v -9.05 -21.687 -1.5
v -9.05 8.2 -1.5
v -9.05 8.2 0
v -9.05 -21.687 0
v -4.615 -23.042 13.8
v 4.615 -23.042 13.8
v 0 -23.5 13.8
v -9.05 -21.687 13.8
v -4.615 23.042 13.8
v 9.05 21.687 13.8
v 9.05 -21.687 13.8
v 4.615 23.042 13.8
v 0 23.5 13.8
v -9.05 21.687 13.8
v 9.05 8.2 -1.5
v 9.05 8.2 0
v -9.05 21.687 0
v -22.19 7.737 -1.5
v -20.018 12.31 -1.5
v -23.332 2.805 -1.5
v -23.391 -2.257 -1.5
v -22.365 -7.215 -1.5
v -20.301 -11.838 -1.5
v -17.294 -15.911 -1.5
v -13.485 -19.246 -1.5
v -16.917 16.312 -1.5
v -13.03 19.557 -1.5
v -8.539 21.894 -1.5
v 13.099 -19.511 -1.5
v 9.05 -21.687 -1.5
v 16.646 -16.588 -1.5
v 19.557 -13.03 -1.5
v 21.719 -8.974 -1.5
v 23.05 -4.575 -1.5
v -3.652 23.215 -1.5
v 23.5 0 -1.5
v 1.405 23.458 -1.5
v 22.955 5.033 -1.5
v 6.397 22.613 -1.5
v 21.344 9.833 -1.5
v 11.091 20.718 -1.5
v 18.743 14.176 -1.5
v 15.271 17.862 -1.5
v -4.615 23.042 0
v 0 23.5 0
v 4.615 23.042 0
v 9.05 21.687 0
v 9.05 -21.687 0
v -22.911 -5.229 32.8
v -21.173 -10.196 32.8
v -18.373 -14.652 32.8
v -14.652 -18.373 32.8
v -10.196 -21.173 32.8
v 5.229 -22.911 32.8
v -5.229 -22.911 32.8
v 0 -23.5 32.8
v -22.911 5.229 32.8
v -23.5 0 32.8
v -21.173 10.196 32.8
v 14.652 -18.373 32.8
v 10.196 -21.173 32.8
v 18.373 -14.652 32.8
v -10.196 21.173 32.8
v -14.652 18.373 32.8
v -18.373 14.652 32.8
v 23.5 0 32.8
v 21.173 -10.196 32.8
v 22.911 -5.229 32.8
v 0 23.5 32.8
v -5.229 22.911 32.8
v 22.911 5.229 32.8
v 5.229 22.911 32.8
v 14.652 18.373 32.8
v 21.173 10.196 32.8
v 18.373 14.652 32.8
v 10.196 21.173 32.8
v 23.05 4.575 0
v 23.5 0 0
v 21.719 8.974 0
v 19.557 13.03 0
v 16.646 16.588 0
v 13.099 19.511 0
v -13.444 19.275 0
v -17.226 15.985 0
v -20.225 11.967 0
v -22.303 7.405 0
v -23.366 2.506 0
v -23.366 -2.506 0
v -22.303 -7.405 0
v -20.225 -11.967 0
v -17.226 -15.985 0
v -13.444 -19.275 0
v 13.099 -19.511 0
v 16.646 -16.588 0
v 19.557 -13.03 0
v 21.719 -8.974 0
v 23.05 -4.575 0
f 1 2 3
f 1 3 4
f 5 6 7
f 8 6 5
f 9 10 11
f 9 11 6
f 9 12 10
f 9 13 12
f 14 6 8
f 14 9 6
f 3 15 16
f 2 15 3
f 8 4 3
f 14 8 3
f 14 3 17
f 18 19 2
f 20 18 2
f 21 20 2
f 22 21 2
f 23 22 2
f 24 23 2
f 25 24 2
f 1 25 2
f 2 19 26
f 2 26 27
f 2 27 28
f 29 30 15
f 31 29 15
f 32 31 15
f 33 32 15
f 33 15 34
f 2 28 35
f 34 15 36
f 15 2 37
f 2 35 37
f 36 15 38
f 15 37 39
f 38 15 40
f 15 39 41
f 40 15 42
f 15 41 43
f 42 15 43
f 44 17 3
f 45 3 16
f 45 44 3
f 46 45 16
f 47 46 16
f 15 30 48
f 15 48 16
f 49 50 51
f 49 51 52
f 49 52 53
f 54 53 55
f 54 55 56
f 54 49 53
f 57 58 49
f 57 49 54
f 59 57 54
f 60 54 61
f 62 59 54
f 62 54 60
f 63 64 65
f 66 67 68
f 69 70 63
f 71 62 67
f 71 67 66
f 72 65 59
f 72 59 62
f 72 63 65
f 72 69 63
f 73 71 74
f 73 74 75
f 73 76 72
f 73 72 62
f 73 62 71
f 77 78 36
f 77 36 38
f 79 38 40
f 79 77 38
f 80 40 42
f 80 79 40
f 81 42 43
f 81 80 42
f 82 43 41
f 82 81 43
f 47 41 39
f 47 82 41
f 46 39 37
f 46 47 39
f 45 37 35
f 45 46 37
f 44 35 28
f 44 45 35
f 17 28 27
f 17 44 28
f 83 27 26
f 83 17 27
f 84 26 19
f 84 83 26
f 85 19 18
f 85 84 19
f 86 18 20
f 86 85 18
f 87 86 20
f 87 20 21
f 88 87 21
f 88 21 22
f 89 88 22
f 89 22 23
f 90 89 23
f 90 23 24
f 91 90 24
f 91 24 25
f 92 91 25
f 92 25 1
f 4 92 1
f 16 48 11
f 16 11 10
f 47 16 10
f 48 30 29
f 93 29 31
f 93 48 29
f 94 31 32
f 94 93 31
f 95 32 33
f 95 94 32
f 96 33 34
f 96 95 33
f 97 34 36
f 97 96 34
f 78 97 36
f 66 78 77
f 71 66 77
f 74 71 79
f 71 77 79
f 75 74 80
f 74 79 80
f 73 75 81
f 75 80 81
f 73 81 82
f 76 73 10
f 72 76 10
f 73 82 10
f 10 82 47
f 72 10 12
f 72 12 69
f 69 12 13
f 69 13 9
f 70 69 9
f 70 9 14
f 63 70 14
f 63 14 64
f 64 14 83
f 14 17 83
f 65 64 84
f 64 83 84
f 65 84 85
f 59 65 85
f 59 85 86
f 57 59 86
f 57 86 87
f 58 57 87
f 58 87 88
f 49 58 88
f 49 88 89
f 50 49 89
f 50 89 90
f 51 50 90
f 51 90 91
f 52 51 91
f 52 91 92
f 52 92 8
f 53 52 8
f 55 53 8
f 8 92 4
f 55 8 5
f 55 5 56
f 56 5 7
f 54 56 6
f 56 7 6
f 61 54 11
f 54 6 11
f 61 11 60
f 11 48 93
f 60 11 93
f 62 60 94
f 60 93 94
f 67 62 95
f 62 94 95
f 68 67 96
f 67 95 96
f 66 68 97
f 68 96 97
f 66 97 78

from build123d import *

# Parameters (mm, degrees)
SKETCH1_R           = 23.5
BOSS_EXTRUDE1_DEPTH = 32.8
SKETCH5_W           = 18.1
SKETCH5_H           = 47
CUT_EXTRUDE1_DEPTH  = 13.8
SKETCH6_R           = 23.5
BOSS_EXTRUDE2_DEPTH = 1.5
CUT_EXTRUDE5_DEPTH  = 1.5


with BuildPart() as part:
    # Sketch1 → Boss-Extrude1 (new body)
    with BuildSketch(Plane.XY):
        Circle(SKETCH1_R)
    extrude(amount=BOSS_EXTRUDE1_DEPTH)

    # Sketch5 → Cut-Extrude1 (cut)
    with BuildSketch(Plane(origin=(0, 0, 0), x_dir=(-1, 0, 0), z_dir=(0, 0, -1))):
        Rectangle(SKETCH5_W, SKETCH5_H)
    extrude(amount=-CUT_EXTRUDE1_DEPTH, mode=Mode.SUBTRACT)

    # Sketch6 → Boss-Extrude2 (add)
    with BuildSketch(Plane.XY):
        Circle(SKETCH6_R)
    extrude(amount=-BOSS_EXTRUDE2_DEPTH)

    # Sketch8 → Cut-Extrude5 (cut)
    with BuildSketch(Plane(origin=(0, 0, -1.5), x_dir=(-1, 0, 0), z_dir=(0, 0, -1))):
        with BuildLine():
            Line((-9.05, 8.2), (9.05, 8.2))
            Line((9.05, 8.2), (9.05, -21.687496398))
            ThreePointArc((9.05, -21.687496398), (0, -23.5), (-9.05, -21.687496398))
            Line((-9.05, -21.687496398), (-9.05, 8.2))
        make_face()
    extrude(amount=-CUT_EXTRUDE5_DEPTH, mode=Mode.SUBTRACT)


solid = part.part
